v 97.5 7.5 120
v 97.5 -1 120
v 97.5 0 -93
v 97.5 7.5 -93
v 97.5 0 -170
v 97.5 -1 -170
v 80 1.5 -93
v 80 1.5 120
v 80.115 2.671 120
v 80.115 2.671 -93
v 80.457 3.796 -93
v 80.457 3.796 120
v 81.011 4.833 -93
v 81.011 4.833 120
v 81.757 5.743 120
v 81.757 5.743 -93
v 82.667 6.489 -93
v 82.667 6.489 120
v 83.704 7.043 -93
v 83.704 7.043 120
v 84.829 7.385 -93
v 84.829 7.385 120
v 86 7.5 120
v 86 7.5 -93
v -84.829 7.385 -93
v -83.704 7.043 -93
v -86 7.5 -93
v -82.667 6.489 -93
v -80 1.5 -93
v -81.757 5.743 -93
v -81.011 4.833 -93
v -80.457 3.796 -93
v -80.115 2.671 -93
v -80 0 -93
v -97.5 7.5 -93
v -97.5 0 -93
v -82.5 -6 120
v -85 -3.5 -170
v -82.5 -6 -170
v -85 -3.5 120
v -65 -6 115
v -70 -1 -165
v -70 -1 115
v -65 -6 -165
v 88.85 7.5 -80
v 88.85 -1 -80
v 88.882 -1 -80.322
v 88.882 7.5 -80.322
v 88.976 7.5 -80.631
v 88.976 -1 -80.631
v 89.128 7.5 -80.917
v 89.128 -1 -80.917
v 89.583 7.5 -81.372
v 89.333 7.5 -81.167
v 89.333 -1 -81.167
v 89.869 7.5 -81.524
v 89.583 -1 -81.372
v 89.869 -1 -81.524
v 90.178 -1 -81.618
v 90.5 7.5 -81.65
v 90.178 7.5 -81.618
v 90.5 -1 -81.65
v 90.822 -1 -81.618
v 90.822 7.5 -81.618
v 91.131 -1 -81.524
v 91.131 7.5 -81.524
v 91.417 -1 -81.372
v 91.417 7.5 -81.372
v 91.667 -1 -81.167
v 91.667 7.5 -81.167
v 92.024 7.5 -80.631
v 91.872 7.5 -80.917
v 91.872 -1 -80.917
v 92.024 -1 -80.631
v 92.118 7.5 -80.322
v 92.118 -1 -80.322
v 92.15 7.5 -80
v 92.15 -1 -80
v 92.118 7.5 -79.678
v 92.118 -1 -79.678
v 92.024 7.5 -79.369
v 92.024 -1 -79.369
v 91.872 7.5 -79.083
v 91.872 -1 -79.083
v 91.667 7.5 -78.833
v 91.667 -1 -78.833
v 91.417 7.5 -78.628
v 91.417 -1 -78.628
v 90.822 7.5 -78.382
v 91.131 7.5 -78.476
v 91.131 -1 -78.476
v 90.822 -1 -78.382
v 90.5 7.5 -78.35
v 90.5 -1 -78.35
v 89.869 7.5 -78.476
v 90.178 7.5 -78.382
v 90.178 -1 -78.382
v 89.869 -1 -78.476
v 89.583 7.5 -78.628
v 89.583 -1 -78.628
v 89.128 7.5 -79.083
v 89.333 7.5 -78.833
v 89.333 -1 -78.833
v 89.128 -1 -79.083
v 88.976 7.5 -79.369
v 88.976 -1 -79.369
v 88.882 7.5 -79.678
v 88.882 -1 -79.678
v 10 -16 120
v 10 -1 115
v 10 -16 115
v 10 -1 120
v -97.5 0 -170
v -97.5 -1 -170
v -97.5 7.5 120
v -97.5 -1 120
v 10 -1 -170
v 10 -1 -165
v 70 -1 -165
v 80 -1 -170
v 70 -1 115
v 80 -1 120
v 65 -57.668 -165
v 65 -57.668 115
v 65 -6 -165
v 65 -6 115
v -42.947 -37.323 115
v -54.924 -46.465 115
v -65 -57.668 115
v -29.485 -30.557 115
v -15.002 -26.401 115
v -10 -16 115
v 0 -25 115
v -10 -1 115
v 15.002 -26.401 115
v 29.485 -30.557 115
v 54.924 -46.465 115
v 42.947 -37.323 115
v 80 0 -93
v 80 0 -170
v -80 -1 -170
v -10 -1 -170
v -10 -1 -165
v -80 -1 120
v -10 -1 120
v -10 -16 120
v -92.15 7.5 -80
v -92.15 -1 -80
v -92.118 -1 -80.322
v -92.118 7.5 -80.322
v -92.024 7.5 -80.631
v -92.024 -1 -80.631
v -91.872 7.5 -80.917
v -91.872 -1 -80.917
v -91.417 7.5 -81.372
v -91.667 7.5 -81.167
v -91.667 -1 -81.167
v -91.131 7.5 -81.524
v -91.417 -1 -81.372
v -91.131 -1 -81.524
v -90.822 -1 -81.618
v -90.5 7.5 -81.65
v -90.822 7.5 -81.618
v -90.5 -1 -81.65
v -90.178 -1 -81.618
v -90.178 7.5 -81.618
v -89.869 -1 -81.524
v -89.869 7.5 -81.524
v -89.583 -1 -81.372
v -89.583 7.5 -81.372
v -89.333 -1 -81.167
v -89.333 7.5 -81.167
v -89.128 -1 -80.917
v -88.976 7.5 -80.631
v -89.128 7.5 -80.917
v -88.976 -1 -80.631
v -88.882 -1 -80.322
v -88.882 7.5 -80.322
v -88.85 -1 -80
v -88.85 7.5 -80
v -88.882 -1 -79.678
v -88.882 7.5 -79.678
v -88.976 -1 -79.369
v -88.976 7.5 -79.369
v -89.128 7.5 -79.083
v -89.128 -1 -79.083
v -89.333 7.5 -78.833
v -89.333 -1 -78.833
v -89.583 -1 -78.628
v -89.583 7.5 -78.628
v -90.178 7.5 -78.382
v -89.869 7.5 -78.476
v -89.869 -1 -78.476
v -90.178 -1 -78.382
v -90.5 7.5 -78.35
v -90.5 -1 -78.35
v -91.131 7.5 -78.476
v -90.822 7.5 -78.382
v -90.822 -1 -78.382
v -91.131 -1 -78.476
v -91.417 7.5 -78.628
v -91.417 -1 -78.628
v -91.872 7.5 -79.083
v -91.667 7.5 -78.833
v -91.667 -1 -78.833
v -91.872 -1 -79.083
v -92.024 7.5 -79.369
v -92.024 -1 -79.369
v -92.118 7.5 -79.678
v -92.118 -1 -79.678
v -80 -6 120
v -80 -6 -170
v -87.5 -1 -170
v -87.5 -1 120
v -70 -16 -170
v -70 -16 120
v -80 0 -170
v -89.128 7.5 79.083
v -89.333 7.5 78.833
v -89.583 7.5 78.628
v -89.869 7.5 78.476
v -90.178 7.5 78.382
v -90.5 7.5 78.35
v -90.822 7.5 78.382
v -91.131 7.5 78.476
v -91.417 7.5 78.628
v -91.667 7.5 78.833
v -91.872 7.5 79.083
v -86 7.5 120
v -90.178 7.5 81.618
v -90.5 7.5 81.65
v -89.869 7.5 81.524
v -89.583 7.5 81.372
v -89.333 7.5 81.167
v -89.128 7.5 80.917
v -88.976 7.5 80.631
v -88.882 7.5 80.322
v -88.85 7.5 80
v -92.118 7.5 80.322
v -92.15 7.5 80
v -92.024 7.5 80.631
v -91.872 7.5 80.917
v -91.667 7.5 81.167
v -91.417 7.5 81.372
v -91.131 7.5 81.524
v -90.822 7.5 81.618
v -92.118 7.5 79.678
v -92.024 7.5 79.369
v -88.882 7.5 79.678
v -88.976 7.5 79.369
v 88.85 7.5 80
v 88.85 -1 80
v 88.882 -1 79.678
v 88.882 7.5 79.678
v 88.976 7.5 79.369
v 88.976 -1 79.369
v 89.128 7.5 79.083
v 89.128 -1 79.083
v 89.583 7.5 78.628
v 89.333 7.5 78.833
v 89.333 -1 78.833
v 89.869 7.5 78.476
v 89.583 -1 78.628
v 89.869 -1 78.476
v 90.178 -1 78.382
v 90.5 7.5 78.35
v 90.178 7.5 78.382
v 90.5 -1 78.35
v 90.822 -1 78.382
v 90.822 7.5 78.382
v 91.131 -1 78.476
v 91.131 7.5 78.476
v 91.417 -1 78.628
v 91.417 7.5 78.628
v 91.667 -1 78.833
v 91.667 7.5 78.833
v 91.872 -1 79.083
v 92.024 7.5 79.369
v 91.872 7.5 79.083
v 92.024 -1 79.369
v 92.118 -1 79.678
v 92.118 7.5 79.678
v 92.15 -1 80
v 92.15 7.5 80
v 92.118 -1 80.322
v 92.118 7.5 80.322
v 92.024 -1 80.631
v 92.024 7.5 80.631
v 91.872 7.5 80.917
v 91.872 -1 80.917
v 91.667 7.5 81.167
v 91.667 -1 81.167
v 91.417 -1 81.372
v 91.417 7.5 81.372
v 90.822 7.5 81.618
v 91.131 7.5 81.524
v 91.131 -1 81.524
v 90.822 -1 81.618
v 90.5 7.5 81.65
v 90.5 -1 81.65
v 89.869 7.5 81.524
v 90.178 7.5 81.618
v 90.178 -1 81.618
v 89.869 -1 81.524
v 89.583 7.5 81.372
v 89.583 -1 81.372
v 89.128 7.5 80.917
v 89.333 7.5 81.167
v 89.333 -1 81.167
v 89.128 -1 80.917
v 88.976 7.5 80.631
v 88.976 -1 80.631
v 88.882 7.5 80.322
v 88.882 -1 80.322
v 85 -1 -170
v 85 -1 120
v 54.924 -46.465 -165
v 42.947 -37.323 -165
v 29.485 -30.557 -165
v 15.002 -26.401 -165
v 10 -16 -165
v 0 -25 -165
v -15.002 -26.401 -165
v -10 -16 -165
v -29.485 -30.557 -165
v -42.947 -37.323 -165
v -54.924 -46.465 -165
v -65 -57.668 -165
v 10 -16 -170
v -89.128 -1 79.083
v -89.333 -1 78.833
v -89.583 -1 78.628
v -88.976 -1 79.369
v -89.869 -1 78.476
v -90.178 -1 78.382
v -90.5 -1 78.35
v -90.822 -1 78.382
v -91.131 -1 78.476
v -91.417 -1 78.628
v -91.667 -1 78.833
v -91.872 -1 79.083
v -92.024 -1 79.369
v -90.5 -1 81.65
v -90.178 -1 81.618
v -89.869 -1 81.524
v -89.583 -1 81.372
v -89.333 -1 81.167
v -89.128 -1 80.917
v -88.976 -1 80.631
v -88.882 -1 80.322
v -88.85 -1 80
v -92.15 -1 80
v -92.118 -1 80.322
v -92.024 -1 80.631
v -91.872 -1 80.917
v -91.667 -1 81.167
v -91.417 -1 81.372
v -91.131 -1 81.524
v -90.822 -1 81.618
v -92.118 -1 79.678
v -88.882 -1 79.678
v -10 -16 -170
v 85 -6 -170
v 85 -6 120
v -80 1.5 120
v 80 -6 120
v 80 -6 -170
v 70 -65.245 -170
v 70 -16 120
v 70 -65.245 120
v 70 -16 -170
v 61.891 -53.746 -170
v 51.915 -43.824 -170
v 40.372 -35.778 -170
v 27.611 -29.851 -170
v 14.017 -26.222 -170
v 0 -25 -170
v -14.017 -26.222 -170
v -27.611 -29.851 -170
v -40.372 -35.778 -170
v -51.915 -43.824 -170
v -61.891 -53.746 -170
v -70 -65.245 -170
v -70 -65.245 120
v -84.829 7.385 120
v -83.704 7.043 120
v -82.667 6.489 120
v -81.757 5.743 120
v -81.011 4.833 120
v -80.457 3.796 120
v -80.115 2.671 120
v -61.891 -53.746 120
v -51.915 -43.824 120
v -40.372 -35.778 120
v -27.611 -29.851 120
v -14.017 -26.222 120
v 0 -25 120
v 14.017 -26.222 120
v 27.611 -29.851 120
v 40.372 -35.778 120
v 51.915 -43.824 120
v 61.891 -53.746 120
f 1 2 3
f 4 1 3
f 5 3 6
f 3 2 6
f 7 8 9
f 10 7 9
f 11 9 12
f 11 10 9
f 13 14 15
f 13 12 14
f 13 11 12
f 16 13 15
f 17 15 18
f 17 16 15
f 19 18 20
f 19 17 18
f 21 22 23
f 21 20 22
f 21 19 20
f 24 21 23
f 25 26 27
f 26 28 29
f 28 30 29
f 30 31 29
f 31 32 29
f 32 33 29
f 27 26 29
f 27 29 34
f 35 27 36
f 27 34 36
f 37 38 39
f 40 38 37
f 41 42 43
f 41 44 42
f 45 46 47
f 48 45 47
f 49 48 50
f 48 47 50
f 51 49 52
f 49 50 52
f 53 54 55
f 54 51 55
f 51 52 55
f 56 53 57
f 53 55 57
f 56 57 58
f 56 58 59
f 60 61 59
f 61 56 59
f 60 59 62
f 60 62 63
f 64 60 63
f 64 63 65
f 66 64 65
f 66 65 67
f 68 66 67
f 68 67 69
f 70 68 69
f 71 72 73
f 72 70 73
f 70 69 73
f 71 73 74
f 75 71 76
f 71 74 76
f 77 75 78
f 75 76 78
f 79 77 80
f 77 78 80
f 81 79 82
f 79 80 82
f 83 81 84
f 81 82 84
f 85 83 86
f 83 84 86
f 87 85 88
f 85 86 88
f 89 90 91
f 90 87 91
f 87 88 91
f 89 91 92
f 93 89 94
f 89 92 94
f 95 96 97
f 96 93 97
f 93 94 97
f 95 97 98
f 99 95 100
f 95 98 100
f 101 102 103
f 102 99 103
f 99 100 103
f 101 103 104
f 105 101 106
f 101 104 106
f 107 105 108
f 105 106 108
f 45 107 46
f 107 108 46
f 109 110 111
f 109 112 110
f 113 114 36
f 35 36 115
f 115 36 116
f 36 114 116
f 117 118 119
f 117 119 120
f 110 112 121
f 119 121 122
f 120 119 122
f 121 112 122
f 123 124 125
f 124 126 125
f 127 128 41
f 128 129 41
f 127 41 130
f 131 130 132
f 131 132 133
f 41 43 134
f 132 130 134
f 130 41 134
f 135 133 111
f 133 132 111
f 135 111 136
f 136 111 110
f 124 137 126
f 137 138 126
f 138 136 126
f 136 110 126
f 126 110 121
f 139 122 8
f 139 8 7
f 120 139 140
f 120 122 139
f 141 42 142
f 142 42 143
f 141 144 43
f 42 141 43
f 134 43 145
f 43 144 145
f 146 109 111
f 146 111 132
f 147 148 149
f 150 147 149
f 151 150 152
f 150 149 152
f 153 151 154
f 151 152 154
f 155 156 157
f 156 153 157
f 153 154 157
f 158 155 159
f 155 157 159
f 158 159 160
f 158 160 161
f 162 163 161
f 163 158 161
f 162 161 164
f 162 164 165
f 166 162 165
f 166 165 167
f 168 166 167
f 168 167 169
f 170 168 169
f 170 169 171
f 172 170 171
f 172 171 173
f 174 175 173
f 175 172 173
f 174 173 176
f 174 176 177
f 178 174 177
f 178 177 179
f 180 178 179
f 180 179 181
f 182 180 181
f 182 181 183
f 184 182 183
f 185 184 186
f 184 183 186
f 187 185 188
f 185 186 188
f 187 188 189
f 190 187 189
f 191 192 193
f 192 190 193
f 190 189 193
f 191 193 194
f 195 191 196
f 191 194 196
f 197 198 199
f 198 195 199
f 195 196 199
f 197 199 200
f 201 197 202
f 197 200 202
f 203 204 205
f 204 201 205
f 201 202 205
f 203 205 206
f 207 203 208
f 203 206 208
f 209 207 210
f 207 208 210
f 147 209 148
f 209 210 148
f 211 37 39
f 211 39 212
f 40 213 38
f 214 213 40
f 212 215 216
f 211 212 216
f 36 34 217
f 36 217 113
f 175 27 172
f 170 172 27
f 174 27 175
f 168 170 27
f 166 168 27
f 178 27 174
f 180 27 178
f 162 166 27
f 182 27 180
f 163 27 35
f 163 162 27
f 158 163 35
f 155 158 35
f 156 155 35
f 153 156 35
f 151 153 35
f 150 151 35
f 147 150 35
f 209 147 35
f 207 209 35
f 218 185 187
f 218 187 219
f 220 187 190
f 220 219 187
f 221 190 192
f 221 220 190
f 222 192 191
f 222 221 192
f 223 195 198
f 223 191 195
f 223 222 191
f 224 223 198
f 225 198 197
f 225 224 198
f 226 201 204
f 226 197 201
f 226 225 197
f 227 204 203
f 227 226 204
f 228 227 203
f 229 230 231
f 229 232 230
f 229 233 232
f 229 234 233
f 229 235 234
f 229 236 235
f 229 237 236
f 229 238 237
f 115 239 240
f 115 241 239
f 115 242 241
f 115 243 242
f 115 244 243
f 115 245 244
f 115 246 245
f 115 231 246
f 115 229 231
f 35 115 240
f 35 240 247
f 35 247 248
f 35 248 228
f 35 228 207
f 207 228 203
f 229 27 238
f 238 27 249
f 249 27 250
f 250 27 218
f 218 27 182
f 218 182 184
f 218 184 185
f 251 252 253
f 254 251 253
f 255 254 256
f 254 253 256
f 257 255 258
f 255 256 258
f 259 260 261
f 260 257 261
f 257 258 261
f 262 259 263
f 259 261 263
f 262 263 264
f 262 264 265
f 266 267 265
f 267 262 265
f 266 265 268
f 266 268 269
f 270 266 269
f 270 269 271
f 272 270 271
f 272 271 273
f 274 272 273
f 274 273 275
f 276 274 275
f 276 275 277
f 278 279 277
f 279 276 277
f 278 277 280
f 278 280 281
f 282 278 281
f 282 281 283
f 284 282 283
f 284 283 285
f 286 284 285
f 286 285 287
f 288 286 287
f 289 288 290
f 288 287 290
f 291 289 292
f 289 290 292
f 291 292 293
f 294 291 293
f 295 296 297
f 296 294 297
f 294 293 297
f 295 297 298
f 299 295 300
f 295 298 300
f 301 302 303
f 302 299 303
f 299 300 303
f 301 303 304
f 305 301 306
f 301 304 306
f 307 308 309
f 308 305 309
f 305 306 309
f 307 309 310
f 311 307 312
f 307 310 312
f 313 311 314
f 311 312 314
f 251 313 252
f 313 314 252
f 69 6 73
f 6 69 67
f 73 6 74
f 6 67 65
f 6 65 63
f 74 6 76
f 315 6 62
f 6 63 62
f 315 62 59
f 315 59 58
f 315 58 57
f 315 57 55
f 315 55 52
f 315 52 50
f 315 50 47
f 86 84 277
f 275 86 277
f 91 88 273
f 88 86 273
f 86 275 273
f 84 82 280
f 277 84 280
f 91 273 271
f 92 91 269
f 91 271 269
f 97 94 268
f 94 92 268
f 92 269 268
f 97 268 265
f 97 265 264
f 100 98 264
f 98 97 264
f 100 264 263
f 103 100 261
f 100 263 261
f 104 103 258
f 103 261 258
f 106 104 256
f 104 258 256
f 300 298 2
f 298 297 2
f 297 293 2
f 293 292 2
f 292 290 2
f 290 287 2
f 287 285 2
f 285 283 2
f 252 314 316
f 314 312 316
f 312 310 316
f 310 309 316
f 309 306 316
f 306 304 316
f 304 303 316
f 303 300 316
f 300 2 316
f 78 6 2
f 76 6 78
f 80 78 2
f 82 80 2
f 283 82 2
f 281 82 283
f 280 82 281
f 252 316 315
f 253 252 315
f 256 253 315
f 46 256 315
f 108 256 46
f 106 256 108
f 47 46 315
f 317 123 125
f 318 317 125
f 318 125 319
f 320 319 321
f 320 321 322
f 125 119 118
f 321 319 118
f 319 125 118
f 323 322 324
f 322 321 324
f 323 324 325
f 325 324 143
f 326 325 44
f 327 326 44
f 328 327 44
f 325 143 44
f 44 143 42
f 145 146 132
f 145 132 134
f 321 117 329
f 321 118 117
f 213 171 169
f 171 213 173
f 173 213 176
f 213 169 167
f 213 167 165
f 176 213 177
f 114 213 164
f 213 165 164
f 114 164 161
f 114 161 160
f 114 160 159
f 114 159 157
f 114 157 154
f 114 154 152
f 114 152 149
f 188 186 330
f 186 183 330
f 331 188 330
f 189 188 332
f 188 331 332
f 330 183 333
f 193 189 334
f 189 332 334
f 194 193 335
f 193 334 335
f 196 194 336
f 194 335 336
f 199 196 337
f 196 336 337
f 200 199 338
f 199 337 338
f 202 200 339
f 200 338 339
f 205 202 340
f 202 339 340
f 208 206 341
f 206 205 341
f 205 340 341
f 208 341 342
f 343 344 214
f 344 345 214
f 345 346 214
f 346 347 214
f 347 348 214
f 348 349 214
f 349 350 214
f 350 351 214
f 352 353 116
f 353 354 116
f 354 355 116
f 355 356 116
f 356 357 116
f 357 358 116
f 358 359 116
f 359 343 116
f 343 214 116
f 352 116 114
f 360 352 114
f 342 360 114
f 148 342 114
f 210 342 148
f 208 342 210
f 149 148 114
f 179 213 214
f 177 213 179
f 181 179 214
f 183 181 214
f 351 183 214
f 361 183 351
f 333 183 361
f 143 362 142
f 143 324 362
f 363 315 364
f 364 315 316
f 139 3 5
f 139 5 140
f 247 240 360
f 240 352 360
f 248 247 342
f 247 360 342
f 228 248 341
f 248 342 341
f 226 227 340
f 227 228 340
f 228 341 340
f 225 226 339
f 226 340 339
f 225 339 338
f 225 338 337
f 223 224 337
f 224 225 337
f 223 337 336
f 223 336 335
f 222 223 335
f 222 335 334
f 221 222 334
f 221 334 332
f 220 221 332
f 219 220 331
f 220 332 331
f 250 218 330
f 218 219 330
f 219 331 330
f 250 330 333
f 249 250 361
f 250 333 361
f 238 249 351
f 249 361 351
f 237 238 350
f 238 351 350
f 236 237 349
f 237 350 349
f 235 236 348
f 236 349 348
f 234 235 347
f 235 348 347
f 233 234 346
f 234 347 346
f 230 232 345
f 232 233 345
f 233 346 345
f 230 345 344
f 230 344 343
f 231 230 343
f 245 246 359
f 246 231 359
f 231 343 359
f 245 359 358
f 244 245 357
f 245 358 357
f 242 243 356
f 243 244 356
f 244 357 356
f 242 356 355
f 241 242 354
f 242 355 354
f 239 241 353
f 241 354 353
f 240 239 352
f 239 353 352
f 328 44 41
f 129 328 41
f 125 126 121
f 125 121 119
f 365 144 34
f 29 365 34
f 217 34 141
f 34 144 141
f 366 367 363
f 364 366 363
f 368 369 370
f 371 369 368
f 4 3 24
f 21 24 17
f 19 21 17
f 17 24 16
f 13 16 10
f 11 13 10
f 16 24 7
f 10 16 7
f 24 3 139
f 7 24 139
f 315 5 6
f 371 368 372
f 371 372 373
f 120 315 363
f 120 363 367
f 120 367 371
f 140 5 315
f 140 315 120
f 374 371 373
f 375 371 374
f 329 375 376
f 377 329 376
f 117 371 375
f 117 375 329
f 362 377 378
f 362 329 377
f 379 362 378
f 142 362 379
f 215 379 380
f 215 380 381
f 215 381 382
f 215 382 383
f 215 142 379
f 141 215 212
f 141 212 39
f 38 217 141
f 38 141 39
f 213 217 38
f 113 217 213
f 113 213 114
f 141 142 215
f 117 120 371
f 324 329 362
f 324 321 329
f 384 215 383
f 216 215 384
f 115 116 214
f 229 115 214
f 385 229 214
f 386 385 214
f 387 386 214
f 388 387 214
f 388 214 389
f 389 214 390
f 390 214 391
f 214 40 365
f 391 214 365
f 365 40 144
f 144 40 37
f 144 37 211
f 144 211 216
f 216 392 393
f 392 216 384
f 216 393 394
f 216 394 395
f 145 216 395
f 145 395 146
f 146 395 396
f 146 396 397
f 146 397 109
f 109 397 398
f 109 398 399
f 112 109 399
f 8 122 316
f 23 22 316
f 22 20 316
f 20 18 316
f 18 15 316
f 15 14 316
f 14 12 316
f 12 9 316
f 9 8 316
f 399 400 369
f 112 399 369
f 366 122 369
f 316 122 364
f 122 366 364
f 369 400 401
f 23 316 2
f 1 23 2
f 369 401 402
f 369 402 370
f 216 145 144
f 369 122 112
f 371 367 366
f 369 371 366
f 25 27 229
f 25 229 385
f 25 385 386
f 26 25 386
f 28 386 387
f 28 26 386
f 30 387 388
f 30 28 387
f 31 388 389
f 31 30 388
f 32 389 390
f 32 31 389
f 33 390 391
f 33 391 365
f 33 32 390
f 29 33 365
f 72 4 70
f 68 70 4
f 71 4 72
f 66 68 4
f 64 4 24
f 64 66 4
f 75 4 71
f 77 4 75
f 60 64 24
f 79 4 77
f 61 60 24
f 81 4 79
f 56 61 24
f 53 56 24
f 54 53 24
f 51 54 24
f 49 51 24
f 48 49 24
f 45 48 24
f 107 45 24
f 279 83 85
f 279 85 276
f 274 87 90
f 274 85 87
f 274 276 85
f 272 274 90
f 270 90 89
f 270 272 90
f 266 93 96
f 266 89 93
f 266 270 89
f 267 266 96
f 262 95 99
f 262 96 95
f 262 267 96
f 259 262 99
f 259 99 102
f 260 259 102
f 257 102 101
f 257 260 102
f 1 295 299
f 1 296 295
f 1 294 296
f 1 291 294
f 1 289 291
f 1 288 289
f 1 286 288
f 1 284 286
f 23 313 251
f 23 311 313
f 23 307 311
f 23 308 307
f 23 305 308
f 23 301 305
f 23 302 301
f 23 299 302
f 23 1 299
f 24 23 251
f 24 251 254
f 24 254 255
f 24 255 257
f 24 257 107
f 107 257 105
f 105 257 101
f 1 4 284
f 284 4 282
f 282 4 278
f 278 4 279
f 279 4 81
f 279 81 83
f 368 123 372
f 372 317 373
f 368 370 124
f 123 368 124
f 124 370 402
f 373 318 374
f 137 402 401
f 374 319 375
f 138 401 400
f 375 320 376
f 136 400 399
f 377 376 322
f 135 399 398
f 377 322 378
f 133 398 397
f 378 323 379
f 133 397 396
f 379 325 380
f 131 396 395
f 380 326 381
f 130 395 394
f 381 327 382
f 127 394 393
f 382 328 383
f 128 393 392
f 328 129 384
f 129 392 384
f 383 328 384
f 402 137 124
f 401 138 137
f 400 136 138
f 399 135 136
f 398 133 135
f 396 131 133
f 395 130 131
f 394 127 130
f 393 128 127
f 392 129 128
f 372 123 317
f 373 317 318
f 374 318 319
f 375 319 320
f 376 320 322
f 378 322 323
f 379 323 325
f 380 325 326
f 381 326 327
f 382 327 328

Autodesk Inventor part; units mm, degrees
ref_plane "YZ Plane" through (0, 0, 0) normal (1, 0, 0) x (0, 1, 0)
ref_plane "XZ Plane" through (0, 0, 0) normal (0, 1, 0) x (-1, 0, 0)
ref_plane "XY Plane" through (0, 0, 0) normal (0, 0, 1) x (1, 0, 0)
sketch "Sketch1" plane through (0, 0, 0) normal (0, 1, 0) x (-1, 0, 0)
  line L0 (-90.5, 80) -> (90.5, 80) construction
  line L1 (90.5, 80) -> (90.5, -80) construction
  line L2 (90.5, -80) -> (-90.5, -80) construction
  line L3 (-90.5, -80) -> (-90.5, 80) construction
  line L4 (-90.5, 80) -> (90.5, -80) construction
  line L5 (90.5, 80) -> (-90.5, -80) construction
  circle A0 centre (90.5, 80) radius 1.65
  circle A1 centre (90.5, -80) radius 1.65
  circle A2 centre (-90.5, -80) radius 1.65
  circle A3 centre (-90.5, 80) radius 1.65
  line L6 (97.5, 120) -> (-97.5, 120)
  line L7 (-97.5, 120) -> (-97.5, -170)
  line L8 (-97.5, -170) -> (97.5, -170)
  line L9 (97.5, -170) -> (97.5, 120)
  line L10 (80, 120) -> (80, -170)
  line L11 (0, 0) -> (0, -42.6616)
  line L12 (-80, 120) -> (-80, -170)
  line L13 (-97.5, -93) -> (97.5, -93)
  point P0 (0, -170)
  point P1 (-80, -93)
  point P2 (80, -93)
  dimension "d0" = 181
  dimension "d1" = 160
  dimension "d2" = 3.3
  dimension "d3" = 40
  dimension "d4" = 290
  dimension "d5" = 7
  dimension "d7" = 10.5
  dimension "d8" = 13
extrude "Extrusion1" add sketch "Sketch1" along normal blind 7.5 contours L9 L13 L10 L6 | L12 L13 L7 L6
extrude "Extrusion2" add sketch "Sketch1" against normal blind 1 contours L9 L13 L10 L6 | L9 L8 L10 L13 | L12 L13 L7 L6 | L12 L8 L7 L13
sketch "Sketch2" plane through (0, -1, 0) normal (0, -1, 0) x (1, 0, 0)
  line L0 (97.5, 120) -> (80, 120) projected
  line L1 (80, 120) -> (80, -170) projected
  line L2 (80, -170) -> (97.5, -170) projected
  line L3 (97.5, -170) -> (97.5, 120) projected
  circle A0 centre (90.5, 80) radius 1.65 projected
  circle A1 centre (90.5, -80) radius 1.65 projected
  line L4 (-97.5, -170) -> (-80, -170) projected
  line L5 (-80, -170) -> (-80, 120) projected
  line L6 (-80, 120) -> (-97.5, 120) projected
  line L7 (-97.5, 120) -> (-97.5, -170) projected
  circle A2 centre (-90.5, -80) radius 1.65 projected
  circle A3 centre (-90.5, 80) radius 1.65 projected
  line L8 (-80, -170) -> (80, -170)
  line L9 (80, -170) -> (80, 120)
  line L10 (80, 120) -> (-80, 120)
  line L11 (-80, 120) -> (-80, -170)
  line L12 (-80, -170) -> (-85, -170)
  line L13 (-85, -170) -> (-85, 120)
  line L14 (-85, 120) -> (-80, 120)
  line L15 (-80, 120) -> (-80, -170)
  line L16 (-70, -170) -> (70, -170)
  line L17 (70, -170) -> (70, 120)
  line L18 (70, 120) -> (-70, 120)
  line L19 (-70, 120) -> (-70, -170)
  line L20 (0, 0) -> (0, 25.7768)
  line L21 (85, -170) -> (85, 120)
  point P0 (0, 120)
  point P1 (85, 120)
  dimension "d13" = 5
  dimension "d14" = 140
extrude "Extrusion3" add sketch "Sketch2" along normal blind 5 contours L21 L2 L1 L0 | L1 L8 L17 L10 | L19 L8 L5 L10 | L5 L4 L13 L6
sketch "Sketch3" plane through (0, -6, 0) normal (0, -1, 0) x (1, 0, 0)
  line L0 (-85, -170) -> (-70, -170) projected
  line L1 (-70, -170) -> (-70, 120) projected
  line L2 (-70, 120) -> (-85, 120) projected
  line L3 (-85, 120) -> (-85, -170) projected
  line L4 (85, 120) -> (70, 120) projected
  line L5 (70, 120) -> (70, -170) projected
  line L6 (70, -170) -> (85, -170) projected
  line L7 (85, -170) -> (85, 120) projected
  line L8 (-70, -170) -> (70, -170)
  line L9 (70, -170) -> (70, 120)
  line L10 (70, 120) -> (-70, 120)
  line L11 (-70, 120) -> (-70, -170)
  line L12 (65, -165) -> (-65, -165)
  line L13 (-65, -165) -> (-65, 115)
  line L14 (-65, 115) -> (65, 115)
  line L15 (65, 115) -> (65, -165)
  point P0 (0, 0)
  dimension "d19" = 140
  dimension "d20" = 290
  dimension "d21" = 5
extrude "Extrusion4" add sketch "Sketch3" along normal blind 100 and the other way blind 5 contours L1 L10 L5 L8
fillet "Fillet1" radius 6 2 edges at (80, 7.5, 13.5) (-80, 7.5, 13.5)
chamfer "Chamfer1" distance 10 angle 45 2 edges at (70, -6, -25) (-70, -6, -25)
chamfer "Chamfer2" distance 5 angle 45 2 edges at (-65, -1, -25) (65, -1, -25)
chamfer "Chamfer3" distance 2.5 angle 45 2 edges at (-85, -1, -25) (-85, -6, -25)
sketch "Sketch4" plane through (97.5, -1, 120) normal (0, 0, 1) x (1, 0, 0)
  line L0 (-180, -5) -> (-185, 0) projected
  line L1 (-177.5, -5) -> (-180, -5) projected
  line L2 (-167.5, -15) -> (-177.5, -5) projected
  line L3 (-167.5, -105) -> (-167.5, -15) projected
  line L4 (-27.5, -105) -> (-167.5, -105) projected
  line L5 (-27.5, -15) -> (-27.5, -105) projected
  line L6 (-17.5, -5) -> (-27.5, -15) projected
  line L7 (-12.5, -5) -> (-17.5, -5) projected
  line L8 (-12.5, 0) -> (-12.5, -5) projected
  line L9 (0, 0) -> (-12.5, 0) projected
  line L10 (0, 0) -> (0, 8.5) projected
  line L11 (-11.5, 8.5) -> (0, 8.5) projected
  arc A0 (-11.5, 8.5) -> (-17.5, 2.5) centre (-11.5, 2.5) ccw projected
  line L12 (-17.5, 0) -> (-17.5, 2.5) projected
  line L13 (-17.5, 0) -> (-177.5, 0) projected
  line L14 (-177.5, 0) -> (-177.5, 2.5) projected
  arc A1 (-177.5, 2.5) -> (-183.5, 8.5) centre (-183.5, 2.5) ccw projected
  line L15 (-195, 8.5) -> (-183.5, 8.5) projected
  line L16 (-195, 0) -> (-195, 8.5) projected
  line L17 (-185, 0) -> (-195, 0) projected
  circle A2 centre (-97.5, -105) radius 81
  line L18 (-107.5, 0) -> (-87.5, 0)
  line L19 (-87.5, 0) -> (-87.5, -15)
  line L20 (-87.5, -15) -> (-107.5, -15)
  line L21 (-107.5, -15) -> (-107.5, 0)
  point P0 (-97.5, 1)
  point P1 (-97.5, 0)
  point P2 (-97.5, -15)
  point P3 (-97.5, 0)
  point P4 (-27.5, -64.2446)
  point P5 (-167.5, -64.2446)
  dimension "d36" = 15
  dimension "d37" = 20
  dimension "d40" = 162
extrude "Extrusion5" cut sketch "Sketch4" against normal through all contours A2 L5 L4 L3 | L13 L19 L20 L21 picked at (-97.5, -78)
properties part number "PUERTA_ACOPLE_ENTRADA" material "Steel, Mild, Welded"
